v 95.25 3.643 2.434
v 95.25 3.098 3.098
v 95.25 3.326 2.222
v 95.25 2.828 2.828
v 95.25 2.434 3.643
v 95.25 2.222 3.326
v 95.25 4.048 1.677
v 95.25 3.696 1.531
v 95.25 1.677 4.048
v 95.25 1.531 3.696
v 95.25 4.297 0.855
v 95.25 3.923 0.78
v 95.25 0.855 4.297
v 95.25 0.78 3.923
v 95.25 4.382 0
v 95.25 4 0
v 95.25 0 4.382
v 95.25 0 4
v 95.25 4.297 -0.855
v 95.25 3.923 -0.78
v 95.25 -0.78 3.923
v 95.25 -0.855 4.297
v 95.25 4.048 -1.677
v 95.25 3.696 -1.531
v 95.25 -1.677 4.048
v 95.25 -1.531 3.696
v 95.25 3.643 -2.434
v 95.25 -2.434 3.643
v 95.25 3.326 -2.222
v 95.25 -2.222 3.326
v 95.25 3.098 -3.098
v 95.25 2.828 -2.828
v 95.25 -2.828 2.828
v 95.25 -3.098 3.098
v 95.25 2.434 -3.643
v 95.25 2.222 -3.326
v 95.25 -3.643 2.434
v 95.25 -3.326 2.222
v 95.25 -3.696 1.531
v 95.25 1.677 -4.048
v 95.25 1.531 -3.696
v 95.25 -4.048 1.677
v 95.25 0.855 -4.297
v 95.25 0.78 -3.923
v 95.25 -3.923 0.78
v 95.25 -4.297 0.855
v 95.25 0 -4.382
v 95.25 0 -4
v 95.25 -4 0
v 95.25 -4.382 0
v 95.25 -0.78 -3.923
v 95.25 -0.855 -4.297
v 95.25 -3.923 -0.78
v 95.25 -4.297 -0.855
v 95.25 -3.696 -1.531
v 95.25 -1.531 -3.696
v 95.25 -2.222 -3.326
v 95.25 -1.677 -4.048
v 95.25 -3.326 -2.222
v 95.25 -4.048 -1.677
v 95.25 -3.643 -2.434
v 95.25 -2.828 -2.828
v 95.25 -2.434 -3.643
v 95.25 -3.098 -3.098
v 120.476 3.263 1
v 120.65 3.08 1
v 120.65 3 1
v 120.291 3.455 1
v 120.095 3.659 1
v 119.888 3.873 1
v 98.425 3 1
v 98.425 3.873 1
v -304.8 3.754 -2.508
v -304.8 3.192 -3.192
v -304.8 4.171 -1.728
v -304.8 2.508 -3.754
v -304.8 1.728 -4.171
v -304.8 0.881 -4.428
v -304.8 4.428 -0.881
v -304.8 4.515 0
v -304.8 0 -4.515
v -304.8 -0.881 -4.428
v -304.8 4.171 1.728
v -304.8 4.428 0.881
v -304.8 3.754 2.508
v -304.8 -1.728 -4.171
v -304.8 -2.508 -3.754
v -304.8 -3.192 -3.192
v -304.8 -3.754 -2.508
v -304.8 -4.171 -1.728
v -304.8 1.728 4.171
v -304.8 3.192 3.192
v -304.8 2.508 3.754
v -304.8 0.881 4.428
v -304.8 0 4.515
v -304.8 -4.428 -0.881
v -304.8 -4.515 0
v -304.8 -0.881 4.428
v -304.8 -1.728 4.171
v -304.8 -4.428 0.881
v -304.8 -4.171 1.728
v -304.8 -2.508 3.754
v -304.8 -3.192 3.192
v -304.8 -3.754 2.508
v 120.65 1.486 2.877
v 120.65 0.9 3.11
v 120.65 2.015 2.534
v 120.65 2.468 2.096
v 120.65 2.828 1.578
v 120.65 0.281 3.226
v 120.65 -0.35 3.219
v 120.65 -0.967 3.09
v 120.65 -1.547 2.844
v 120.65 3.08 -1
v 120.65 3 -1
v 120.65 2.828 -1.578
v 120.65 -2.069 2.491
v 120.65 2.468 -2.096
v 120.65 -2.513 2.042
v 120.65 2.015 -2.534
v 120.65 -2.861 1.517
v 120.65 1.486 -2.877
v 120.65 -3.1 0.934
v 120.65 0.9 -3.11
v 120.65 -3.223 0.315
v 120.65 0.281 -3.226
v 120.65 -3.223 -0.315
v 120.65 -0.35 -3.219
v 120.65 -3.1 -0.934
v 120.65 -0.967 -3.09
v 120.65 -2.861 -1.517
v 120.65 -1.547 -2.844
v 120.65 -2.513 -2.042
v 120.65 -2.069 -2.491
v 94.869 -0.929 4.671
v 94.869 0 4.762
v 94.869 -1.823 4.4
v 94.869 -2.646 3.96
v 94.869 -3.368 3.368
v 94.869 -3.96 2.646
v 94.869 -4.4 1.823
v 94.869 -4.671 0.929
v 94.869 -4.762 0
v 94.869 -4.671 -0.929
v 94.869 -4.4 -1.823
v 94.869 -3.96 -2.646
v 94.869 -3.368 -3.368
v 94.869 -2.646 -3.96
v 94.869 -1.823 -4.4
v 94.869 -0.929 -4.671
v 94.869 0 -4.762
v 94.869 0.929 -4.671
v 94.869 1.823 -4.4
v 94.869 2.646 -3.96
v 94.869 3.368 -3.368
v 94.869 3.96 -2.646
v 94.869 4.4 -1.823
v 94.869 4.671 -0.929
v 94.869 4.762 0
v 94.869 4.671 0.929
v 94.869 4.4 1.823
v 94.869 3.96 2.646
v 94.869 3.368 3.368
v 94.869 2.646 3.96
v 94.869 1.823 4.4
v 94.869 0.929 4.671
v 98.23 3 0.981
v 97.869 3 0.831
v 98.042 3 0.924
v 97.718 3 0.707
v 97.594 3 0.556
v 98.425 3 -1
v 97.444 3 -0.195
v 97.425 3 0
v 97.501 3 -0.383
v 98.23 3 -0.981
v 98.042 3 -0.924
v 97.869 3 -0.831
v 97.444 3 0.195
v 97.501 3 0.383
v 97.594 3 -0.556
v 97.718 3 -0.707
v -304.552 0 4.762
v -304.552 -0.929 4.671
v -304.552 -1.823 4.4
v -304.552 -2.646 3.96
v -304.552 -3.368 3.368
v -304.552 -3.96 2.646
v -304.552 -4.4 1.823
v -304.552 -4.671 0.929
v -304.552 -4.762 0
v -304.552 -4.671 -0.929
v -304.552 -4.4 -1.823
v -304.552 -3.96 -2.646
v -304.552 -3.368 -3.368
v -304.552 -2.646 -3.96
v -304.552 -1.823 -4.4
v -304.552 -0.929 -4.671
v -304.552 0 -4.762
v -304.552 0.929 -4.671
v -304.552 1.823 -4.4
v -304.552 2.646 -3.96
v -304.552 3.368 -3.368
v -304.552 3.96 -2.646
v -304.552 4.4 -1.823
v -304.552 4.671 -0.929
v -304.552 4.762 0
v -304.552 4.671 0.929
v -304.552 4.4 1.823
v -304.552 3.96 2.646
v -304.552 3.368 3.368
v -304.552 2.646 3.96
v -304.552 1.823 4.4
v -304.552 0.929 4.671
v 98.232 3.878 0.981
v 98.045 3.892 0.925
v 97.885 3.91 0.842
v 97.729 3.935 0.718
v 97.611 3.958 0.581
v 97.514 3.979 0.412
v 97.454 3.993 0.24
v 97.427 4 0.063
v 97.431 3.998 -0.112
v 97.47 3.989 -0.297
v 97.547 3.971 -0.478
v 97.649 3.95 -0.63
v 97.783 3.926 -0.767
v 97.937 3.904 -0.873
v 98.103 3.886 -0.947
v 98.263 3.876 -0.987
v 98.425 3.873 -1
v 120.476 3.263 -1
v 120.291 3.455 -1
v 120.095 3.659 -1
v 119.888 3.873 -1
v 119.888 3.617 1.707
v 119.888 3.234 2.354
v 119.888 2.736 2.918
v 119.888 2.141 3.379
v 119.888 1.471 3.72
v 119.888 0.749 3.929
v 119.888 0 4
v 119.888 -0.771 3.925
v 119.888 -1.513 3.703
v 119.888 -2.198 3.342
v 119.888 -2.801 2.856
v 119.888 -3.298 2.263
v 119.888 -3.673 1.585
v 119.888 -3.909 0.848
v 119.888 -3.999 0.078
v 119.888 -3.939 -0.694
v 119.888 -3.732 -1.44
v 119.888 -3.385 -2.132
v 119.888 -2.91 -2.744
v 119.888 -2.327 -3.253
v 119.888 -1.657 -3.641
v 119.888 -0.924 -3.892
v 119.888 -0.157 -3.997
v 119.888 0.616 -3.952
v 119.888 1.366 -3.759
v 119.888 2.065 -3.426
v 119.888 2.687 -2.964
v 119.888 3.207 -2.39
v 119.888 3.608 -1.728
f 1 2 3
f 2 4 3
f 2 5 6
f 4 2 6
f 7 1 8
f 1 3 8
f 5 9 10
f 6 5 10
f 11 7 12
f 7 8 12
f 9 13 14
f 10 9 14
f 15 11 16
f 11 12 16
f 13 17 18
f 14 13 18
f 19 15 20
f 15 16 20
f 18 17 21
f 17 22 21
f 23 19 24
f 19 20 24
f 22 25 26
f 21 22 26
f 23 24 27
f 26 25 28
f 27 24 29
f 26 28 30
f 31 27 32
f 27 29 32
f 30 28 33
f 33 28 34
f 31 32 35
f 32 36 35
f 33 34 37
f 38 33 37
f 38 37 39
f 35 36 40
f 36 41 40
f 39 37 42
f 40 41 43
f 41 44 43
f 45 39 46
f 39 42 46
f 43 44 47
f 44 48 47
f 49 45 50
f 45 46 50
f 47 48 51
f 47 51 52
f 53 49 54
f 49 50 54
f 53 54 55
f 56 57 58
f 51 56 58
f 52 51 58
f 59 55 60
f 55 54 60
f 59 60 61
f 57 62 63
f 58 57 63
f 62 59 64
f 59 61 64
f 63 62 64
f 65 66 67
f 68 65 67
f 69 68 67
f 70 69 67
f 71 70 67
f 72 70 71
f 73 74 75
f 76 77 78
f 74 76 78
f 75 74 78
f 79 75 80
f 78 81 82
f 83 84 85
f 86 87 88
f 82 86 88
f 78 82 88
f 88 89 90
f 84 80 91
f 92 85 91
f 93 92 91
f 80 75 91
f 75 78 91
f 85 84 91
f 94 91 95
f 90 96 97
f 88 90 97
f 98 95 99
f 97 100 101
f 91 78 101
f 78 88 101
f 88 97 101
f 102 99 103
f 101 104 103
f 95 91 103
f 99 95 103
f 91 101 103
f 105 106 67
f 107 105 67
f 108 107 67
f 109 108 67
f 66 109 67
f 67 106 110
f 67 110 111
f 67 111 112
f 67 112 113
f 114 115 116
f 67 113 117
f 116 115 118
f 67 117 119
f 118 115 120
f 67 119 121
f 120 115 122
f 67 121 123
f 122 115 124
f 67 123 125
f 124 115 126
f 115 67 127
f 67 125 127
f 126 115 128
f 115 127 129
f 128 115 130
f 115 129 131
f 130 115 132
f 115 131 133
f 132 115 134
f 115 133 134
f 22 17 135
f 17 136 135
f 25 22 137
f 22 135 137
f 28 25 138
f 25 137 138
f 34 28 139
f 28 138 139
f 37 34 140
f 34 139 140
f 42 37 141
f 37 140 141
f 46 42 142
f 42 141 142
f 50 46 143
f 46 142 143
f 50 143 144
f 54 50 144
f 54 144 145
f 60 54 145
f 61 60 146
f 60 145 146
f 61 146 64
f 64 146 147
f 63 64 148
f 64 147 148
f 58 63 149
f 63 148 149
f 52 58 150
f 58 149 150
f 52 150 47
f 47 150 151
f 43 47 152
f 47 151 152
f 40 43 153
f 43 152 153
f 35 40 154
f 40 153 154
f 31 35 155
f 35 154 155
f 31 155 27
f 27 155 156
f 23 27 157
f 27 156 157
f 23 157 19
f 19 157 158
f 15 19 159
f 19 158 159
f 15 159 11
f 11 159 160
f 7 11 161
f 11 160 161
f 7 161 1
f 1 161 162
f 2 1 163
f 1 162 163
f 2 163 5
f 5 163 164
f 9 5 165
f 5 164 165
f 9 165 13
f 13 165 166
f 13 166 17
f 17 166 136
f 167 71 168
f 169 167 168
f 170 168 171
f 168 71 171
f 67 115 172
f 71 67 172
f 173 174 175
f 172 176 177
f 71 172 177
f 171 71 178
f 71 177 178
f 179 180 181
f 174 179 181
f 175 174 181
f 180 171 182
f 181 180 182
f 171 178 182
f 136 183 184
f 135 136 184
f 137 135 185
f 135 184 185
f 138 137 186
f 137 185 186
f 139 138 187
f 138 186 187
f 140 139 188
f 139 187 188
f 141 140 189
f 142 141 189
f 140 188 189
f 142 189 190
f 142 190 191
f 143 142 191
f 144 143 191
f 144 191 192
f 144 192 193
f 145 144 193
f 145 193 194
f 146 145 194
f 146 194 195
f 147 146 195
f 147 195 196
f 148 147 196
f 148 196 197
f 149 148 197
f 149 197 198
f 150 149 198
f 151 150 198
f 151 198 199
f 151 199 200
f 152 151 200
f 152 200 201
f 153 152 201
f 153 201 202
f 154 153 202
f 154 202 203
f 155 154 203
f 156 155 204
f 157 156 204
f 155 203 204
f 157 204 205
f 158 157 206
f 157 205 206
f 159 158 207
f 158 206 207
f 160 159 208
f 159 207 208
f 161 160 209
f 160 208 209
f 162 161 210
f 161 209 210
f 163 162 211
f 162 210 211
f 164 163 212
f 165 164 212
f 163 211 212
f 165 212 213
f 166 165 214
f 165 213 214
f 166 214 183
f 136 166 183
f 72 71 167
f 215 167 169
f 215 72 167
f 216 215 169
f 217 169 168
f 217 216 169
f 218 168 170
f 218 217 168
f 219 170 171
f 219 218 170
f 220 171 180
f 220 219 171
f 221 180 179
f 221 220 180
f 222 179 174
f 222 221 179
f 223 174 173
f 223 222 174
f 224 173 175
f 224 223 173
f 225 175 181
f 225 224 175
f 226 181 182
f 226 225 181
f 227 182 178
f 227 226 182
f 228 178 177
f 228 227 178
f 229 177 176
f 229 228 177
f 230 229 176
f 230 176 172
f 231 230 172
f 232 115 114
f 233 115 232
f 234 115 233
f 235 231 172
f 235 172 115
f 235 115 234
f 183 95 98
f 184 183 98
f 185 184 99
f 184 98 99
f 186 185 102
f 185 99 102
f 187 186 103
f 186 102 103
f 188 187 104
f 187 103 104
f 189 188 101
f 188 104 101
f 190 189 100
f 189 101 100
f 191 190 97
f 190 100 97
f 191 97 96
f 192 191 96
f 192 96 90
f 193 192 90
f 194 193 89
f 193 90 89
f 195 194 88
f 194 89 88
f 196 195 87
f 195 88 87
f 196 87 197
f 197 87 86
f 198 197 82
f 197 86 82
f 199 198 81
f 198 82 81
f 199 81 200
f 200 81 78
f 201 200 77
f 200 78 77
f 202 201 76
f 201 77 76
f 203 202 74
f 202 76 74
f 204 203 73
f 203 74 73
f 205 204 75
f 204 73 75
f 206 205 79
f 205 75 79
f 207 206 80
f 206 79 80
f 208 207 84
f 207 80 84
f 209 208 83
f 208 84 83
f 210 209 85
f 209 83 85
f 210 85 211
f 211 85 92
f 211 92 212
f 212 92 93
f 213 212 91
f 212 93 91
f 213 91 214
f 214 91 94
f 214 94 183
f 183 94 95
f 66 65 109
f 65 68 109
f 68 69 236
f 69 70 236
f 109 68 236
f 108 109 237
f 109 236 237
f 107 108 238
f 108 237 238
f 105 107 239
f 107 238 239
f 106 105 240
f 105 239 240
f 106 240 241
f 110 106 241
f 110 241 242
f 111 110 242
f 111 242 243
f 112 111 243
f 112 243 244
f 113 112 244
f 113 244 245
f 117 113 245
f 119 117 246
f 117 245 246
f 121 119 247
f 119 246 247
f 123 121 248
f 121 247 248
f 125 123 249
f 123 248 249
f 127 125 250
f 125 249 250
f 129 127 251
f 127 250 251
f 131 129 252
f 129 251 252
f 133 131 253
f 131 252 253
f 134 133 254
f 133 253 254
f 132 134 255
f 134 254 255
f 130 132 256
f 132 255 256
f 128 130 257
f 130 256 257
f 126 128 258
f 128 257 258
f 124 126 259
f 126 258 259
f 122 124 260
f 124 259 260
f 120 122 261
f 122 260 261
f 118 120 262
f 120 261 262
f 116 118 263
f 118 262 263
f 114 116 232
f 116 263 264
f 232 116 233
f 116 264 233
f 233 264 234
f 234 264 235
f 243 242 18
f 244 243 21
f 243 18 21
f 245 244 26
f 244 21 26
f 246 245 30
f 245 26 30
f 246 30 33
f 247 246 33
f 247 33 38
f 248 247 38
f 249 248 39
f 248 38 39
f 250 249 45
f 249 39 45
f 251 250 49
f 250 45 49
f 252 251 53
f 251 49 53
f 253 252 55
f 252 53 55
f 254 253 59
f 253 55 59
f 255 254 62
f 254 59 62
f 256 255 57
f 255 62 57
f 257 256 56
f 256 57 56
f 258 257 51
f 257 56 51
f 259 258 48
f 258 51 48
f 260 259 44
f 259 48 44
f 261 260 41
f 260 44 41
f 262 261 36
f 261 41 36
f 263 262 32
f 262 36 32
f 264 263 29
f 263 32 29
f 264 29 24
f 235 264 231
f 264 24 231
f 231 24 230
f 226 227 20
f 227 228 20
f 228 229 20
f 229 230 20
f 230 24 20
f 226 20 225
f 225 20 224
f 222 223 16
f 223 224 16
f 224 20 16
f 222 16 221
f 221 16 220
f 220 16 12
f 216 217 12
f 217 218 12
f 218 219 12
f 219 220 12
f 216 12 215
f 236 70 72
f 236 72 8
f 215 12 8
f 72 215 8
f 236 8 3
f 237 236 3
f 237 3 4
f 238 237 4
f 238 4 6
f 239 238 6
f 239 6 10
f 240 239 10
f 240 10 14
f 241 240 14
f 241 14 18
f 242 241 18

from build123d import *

# Parameters (mm, degrees)
BOSS_EXTRUDE1_DEPTH      = 304.8
BOSS_EXTRUDE1_DEPTH_BACK = 304.8
SKETCH4_R                = 4.7625
CHAMFER1_SIZE            = 0.24765
CUT_EXTRUDE1_START       = 4
CUT_EXTRUDE1_DEPTH       = 1


with BuildPart() as part:
    # Sketch4 → Boss-Extrude1 (new, two sides: drawn at the far end of the back side and taken through both)
    with BuildSketch(Plane(origin=(0, 0, 0), x_dir=(0, 0, -1), z_dir=(1, 0, 0)).offset(-BOSS_EXTRUDE1_DEPTH_BACK)):
        with Locations(Location((0, 0, 0), (0, 0, 180))):
            Circle(SKETCH4_R)
    extrude(amount=BOSS_EXTRUDE1_DEPTH + BOSS_EXTRUDE1_DEPTH_BACK)

    # Chamfer1
    chamfer1_edges = [part.edges().sort_by_distance(p)[0] for p in [
        (-304.8, 0, -4.7625),
        (304.8, 0, -4.7625),
    ]]
    chamfer(chamfer1_edges, length=CHAMFER1_SIZE)

    # Sketch5 → Cut-Revolve1 (revolve, cut)
    with BuildSketch(Plane.XY, mode=Mode.PRIVATE) as cut_revolve1_sk:
        Polygon((304.8, 0), (120.65, 0), (120.65, 3.238), (119.888, 4), (95.25, 4), (95.25, 4.3815), (94.869, 4.7625), (304.8, 4.7625), align=None)
    revolve(cut_revolve1_sk.sketch.rotate(Axis((120.65, 0, 0), (1, 0, 0)), 90), axis=Axis((120.65, 0, 0), (1, 0, 0)), mode=Mode.SUBTRACT)

    # Sketch6 → Cut-Extrude1 (cut)
    with BuildSketch(Plane(origin=(0, 0, 0), x_dir=(1, 0, 0), z_dir=(0, 1, 0)).offset(CUT_EXTRUDE1_START)):
        with BuildLine():
            Line((120.65, -1), (98.425, -1))
            ThreePointArc((98.425, -1), (97.425, 0), (98.425, 1))
            Line((98.425, 1), (120.65, 1))
            ThreePointArc((120.65, 1), (121.65, 0), (120.65, -1))
        make_face()
    extrude(amount=-CUT_EXTRUDE1_DEPTH, mode=Mode.SUBTRACT)


solid = part.part
